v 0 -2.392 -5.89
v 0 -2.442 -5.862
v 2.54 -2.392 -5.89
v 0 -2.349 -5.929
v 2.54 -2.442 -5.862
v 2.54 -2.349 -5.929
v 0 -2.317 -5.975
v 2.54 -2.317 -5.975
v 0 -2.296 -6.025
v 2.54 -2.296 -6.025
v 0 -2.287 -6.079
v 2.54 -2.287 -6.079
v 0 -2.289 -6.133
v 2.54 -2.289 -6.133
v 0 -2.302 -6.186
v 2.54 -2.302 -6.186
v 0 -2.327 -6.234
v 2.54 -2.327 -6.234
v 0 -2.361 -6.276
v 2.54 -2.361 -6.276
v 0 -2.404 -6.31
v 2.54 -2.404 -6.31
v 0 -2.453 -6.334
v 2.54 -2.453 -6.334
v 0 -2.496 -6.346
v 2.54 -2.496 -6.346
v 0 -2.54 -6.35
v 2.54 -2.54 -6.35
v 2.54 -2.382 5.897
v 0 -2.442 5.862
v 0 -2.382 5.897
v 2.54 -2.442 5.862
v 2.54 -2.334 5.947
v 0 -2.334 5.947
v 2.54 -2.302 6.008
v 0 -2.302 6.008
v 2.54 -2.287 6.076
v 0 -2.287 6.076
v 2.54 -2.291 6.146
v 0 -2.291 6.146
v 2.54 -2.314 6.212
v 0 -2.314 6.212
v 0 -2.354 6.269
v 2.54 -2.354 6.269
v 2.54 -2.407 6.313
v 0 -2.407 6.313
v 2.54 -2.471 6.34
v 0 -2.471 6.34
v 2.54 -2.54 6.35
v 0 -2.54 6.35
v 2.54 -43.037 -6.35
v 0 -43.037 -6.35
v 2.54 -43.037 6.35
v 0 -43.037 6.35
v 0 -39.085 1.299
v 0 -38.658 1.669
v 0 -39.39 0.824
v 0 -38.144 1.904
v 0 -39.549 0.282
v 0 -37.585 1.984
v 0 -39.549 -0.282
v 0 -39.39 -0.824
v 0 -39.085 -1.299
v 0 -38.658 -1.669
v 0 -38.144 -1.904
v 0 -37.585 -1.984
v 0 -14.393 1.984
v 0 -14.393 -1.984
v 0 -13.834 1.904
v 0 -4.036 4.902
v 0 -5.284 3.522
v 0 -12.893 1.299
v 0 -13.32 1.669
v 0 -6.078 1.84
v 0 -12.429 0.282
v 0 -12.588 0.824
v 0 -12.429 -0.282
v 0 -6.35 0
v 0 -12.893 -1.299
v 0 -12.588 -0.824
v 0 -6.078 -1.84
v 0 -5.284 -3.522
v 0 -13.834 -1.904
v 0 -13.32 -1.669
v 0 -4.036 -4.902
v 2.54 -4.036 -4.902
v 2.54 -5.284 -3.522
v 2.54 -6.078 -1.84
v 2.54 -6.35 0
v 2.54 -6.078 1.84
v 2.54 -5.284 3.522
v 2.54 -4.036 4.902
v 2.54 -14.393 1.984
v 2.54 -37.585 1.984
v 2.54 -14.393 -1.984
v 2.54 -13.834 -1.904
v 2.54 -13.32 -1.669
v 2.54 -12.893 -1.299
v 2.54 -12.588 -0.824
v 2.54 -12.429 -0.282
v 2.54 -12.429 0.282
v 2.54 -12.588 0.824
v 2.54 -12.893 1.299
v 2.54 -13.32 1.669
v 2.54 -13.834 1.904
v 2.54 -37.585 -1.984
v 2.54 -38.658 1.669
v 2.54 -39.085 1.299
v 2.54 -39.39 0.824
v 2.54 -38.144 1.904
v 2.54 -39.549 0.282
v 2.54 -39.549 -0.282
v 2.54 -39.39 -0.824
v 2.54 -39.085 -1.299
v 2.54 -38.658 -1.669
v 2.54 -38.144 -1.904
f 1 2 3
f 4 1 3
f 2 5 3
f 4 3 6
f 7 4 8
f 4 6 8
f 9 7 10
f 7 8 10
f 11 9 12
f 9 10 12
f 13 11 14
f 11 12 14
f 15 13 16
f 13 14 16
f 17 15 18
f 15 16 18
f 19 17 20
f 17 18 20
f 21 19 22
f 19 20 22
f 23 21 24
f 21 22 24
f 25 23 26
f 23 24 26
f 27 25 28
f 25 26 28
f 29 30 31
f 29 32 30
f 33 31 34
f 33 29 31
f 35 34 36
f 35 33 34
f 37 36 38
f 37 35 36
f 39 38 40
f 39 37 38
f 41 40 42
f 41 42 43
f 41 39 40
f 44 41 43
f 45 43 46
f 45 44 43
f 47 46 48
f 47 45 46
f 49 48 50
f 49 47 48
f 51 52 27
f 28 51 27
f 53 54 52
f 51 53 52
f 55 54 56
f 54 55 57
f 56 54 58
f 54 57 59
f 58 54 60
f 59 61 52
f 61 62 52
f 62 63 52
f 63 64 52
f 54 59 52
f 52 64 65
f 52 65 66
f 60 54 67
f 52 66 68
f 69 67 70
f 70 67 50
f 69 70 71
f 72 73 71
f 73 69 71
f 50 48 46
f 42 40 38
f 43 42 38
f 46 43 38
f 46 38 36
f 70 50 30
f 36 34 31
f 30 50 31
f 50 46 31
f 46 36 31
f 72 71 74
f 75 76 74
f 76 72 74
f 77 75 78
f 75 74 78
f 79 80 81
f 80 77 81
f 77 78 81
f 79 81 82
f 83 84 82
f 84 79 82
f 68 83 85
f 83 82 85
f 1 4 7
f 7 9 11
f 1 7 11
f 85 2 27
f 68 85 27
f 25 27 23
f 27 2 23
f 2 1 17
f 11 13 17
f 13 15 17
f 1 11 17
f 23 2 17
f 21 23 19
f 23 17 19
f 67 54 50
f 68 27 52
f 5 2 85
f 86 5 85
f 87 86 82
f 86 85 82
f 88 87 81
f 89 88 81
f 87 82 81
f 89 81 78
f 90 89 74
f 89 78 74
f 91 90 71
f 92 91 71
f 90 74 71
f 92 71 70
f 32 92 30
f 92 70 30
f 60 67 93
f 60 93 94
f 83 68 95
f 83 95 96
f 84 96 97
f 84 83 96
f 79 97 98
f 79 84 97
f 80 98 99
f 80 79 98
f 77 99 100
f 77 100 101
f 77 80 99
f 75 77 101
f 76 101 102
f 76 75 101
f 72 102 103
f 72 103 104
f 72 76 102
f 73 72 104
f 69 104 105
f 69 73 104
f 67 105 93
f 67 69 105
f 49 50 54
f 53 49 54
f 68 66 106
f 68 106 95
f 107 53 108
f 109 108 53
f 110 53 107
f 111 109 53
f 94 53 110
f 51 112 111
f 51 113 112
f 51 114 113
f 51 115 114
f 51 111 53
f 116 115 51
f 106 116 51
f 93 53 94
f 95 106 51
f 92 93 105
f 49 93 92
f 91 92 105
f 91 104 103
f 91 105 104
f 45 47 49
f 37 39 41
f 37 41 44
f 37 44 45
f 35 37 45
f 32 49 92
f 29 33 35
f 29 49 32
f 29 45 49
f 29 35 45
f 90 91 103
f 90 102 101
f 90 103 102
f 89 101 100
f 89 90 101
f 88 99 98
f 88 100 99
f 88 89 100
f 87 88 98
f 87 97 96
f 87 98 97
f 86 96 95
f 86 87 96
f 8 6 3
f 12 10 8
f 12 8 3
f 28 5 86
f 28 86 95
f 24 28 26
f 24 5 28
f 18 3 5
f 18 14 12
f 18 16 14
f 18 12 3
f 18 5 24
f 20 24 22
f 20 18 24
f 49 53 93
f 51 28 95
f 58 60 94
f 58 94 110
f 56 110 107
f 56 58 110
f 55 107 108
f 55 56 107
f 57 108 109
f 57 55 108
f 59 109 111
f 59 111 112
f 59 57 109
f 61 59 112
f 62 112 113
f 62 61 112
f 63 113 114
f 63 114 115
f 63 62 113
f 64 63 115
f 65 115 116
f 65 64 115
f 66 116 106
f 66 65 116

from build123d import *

# Parameters (mm, degrees)
BOSS_EXTRUDE1_DEPTH = 2.54
FILLET1_R           = 0.254
CUT_EXTRUDE1_DEPTH  = 2.54


with BuildPart() as part:
    # Sketch1 → Boss-Extrude1 (new body)
    with BuildSketch(Plane(origin=(0, 0, 0), x_dir=(0, 0, -1), z_dir=(1, 0, 0))):
        with BuildLine():
            ThreePointArc((6.35, 0), (0, -6.35), (-6.35, 0))
            Line((-6.35, 0), (-6.35, -43.036593364))
            Line((-6.35, -43.036593364), (6.35, -43.036593364))
            Line((6.35, -43.036593364), (6.35, 0))
        make_face()
    extrude(amount=BOSS_EXTRUDE1_DEPTH)

    # Fillet1
    fillet1_edges = [part.edges().sort_by_distance(p)[0] for p in [
        (1.27, 0, -6.35),
        (1.27, 0, 6.35),
    ]]
    fillet(fillet1_edges, radius=FILLET1_R)

    # Sketch2 → Cut-Extrude1 (cut)
    with BuildSketch(Plane.ZY):
        with BuildLine():
            Line((1.984375, -14.393108905), (1.984375, -37.585187193))
            ThreePointArc((1.984375, -37.585187193), (0, -39.569562193), (-1.984375, -37.585187193))
            Line((-1.984375, -37.585187193), (-1.984375, -14.393108905))
            ThreePointArc((-1.984375, -14.393108905), (0, -12.408733905), (1.984375, -14.393108905))
        make_face()
    extrude(amount=-CUT_EXTRUDE1_DEPTH, mode=Mode.SUBTRACT)


solid = part.part
